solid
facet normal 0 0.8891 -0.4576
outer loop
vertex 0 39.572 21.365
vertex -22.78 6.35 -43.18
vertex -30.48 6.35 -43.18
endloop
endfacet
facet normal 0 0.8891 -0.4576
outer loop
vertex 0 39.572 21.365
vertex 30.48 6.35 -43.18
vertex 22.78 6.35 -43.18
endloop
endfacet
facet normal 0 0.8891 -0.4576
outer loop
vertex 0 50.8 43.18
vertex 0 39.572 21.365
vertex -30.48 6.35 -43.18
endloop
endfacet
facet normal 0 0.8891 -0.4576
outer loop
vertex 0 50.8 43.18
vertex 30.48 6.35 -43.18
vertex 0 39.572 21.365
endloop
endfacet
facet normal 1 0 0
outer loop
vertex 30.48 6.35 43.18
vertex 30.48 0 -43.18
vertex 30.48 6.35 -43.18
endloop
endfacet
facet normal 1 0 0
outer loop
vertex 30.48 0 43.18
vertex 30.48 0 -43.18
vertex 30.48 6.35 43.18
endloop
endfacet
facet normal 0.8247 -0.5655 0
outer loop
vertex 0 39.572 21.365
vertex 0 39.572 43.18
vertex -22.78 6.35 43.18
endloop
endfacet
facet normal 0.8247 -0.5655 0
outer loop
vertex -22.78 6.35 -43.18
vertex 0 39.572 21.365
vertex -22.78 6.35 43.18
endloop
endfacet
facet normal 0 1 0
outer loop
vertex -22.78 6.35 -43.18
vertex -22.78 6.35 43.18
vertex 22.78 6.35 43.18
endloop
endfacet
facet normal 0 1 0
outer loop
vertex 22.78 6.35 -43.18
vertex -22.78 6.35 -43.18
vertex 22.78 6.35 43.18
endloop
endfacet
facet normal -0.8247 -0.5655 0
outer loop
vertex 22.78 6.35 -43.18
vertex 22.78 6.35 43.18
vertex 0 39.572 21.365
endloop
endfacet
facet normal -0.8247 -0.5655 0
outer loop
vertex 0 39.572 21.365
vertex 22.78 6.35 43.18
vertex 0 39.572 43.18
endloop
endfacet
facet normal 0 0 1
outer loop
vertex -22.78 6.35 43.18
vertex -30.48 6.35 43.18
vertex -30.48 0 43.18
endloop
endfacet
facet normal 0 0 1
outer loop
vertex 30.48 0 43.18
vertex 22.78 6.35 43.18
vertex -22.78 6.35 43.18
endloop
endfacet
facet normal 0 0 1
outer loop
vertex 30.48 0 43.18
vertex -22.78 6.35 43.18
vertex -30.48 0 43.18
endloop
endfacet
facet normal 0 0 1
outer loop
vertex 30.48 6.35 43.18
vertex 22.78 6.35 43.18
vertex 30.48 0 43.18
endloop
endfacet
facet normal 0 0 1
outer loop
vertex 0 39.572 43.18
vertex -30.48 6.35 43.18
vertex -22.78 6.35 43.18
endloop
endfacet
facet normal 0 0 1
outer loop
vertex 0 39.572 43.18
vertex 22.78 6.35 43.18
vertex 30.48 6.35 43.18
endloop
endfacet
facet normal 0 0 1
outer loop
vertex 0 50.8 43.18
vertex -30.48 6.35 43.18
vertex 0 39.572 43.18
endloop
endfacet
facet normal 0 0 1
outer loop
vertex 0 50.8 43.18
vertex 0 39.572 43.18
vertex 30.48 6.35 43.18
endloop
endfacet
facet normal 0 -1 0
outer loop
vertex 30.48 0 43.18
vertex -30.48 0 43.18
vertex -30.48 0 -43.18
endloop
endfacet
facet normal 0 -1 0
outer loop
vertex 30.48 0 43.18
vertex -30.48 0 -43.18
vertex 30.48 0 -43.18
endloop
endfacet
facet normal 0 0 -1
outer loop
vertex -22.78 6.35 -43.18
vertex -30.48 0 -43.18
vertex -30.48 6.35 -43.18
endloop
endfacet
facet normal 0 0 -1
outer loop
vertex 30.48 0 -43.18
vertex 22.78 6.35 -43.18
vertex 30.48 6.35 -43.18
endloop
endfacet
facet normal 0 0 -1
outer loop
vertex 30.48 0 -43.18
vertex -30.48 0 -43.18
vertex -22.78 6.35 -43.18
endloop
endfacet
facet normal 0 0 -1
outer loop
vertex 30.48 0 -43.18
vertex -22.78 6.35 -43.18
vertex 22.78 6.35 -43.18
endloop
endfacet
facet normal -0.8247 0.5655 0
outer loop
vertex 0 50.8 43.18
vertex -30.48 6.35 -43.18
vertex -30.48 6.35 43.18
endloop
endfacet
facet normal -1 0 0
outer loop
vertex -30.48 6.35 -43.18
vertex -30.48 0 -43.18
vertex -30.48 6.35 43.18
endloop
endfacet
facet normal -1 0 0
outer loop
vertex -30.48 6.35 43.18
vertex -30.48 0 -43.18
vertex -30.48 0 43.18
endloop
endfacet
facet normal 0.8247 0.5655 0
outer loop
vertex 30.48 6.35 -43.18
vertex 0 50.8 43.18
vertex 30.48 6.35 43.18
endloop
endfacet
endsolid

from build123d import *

# Parameters (mm, degrees)
F0_W      = 60.96
F0_H      = 86.36
F1_DEPTH  = 6.35
F1_FACE_W = 60.96
F1_FACE_H = 86.36
F6_DEPTH  = 86.361


with BuildPart() as f1:
    # F0 (on Front) → F1 (new body)
    with BuildSketch(Plane.XZ):
        Rectangle(F0_W, F0_H)
    extrude(amount=-F1_DEPTH)

    # F1_face (on face) → F4 section 0
    with BuildSketch(Plane(origin=(0, 6.35, 0), x_dir=(1, 0, 0), z_dir=(0, 1, 0)), mode=Mode.PRIVATE) as f4_s0:
        Rectangle(F1_FACE_W, F1_FACE_H)
    loft([f4_s0.sketch, Vertex(0, 50.8, 43.18)])

    # F5 (on face) → F6 (cut, through all)
    with BuildSketch(Plane.XY.offset(43.18)):
        Polygon((0, 39.571562), (-22.7805, 6.35), (22.7805, 6.35), align=None)
    extrude(amount=-F6_DEPTH, mode=Mode.SUBTRACT)


solid = f1.part
